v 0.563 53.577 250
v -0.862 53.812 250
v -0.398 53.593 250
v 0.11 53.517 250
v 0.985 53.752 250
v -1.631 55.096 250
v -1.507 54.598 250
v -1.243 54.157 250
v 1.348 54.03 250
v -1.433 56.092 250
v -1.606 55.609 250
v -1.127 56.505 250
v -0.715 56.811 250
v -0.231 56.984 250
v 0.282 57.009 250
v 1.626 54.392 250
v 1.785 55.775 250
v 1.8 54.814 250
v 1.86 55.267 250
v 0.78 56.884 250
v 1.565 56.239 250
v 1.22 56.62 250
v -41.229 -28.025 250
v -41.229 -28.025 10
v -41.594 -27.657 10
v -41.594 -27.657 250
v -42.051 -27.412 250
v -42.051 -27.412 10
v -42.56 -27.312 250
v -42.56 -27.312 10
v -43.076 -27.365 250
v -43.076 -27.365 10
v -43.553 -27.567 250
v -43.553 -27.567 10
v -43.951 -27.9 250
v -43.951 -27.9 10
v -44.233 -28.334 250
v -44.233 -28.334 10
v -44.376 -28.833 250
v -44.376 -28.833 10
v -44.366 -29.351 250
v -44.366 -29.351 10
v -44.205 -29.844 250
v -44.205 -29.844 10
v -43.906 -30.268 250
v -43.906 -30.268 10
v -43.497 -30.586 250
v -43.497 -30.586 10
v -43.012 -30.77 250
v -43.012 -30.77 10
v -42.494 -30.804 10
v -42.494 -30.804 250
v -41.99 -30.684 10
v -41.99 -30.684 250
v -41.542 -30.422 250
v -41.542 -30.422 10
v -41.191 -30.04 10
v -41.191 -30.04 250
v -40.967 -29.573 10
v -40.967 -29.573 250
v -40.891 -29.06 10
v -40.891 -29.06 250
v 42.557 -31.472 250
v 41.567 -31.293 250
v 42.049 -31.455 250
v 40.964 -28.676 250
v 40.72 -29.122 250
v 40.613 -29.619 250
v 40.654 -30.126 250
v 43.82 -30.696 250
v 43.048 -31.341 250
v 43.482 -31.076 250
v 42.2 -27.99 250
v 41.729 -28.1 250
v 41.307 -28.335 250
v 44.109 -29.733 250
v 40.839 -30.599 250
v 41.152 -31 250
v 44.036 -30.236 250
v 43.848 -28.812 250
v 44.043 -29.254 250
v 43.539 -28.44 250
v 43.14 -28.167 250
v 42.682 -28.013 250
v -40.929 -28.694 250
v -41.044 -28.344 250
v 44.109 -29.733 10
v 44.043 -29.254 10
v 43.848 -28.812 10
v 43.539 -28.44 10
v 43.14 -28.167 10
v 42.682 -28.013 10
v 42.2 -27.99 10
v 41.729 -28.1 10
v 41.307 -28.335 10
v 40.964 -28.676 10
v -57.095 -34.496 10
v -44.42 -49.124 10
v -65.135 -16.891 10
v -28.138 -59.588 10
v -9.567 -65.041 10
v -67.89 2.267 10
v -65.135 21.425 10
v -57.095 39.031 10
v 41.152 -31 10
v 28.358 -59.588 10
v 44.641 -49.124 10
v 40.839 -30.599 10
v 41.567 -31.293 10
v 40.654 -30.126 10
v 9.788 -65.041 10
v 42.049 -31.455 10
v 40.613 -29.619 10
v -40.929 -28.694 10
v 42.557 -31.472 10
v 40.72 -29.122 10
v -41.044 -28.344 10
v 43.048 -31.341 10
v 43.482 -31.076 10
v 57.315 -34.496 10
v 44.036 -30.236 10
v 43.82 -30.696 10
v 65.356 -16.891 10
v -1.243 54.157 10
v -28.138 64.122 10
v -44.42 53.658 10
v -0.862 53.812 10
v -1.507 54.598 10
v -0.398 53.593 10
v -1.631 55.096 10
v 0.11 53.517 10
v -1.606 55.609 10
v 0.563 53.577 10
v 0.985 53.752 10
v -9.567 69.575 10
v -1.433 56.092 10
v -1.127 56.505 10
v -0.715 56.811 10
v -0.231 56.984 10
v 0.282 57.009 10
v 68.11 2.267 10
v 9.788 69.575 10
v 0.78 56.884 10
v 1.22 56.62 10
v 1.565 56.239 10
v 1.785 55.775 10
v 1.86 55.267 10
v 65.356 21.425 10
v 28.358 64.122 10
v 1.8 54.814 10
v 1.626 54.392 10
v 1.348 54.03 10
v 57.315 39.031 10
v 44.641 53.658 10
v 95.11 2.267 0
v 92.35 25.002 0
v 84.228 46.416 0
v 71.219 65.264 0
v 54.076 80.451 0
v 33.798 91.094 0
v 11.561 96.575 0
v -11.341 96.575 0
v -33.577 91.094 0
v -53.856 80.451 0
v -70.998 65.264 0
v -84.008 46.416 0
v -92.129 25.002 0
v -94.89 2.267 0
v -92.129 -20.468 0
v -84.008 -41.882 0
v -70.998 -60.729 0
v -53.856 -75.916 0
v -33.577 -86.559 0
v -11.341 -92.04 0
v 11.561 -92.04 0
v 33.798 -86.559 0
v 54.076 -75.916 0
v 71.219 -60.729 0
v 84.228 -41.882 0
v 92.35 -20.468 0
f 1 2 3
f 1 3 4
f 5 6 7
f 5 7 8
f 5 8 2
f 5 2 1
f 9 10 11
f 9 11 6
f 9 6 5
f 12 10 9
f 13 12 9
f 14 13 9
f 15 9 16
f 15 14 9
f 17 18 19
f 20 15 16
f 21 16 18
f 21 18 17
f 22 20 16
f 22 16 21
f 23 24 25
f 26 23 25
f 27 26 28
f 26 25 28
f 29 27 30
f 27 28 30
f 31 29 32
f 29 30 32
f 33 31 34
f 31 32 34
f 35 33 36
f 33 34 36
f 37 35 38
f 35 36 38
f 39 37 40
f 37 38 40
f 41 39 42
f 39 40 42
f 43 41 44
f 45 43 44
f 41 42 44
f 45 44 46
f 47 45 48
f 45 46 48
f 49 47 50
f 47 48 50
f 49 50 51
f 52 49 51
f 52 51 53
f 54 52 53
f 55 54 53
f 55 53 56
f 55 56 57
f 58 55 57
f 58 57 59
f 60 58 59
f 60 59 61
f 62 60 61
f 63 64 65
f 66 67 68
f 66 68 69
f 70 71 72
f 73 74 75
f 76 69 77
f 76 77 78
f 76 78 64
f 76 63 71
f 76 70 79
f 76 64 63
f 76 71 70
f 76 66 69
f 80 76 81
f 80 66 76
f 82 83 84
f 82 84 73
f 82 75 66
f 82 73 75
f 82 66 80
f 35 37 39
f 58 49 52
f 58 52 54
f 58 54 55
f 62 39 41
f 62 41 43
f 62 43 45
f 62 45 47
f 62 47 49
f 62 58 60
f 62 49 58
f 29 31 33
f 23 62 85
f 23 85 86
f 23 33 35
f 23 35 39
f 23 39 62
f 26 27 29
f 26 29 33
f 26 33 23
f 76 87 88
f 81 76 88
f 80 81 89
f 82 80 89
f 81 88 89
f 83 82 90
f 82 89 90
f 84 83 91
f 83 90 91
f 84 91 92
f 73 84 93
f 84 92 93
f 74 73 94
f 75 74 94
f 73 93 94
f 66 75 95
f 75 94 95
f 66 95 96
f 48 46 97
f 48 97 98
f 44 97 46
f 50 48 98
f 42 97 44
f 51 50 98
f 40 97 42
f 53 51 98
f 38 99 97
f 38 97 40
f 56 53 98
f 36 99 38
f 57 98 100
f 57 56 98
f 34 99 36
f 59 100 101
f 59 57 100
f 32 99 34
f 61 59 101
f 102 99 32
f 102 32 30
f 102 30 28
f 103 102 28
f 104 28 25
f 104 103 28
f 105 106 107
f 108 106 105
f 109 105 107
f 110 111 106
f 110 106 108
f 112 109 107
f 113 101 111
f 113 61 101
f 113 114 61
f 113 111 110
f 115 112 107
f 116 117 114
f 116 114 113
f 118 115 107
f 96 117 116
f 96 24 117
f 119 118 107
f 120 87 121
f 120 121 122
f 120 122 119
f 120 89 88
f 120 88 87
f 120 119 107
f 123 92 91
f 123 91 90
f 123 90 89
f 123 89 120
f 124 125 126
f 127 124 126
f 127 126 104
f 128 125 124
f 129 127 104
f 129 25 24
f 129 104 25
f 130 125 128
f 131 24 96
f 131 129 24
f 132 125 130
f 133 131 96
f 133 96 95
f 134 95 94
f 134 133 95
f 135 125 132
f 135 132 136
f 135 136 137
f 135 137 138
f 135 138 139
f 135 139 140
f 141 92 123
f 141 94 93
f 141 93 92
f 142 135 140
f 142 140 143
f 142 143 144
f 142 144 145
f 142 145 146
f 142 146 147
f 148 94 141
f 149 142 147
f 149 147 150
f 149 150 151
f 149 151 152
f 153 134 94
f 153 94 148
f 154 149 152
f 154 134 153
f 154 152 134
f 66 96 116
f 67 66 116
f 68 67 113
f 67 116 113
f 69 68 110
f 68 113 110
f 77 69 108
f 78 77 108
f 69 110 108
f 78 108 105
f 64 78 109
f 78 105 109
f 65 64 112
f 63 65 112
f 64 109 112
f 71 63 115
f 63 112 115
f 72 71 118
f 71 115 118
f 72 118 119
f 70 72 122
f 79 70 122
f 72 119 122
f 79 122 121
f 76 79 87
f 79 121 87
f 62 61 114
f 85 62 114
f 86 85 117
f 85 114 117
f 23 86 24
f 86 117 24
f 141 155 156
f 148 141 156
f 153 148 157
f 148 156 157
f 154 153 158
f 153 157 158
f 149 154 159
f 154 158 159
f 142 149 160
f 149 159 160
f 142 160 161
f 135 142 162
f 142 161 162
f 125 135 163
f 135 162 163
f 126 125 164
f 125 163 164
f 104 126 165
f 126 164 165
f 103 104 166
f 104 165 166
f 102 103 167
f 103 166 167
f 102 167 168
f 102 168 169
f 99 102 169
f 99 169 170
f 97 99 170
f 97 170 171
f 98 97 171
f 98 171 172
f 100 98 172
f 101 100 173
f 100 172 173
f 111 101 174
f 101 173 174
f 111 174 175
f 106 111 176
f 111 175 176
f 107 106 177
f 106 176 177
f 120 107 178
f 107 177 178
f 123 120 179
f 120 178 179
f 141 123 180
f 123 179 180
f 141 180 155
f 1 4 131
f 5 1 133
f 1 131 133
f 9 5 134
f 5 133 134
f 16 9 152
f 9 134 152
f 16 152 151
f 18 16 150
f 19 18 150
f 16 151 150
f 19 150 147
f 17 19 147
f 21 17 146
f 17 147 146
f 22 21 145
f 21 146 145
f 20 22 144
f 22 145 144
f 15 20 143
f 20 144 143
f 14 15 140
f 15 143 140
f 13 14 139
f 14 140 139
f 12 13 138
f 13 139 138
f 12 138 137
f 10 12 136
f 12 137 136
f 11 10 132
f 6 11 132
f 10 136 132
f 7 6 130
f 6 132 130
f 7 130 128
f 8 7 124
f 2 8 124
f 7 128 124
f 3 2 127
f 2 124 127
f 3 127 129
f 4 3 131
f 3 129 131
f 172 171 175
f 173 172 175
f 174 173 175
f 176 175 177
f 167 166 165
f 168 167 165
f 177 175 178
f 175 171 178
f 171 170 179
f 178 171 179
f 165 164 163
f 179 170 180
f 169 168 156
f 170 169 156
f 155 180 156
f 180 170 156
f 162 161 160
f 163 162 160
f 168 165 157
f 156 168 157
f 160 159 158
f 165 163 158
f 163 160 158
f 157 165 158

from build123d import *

# Parameters (mm, degrees)
F0_R     = 95
F0_R_2   = 67.5
F1_DEPTH = 10
F2_DEPTH = 250
F3_SIZE2 = 9.99999
F3_SIZE  = 26.99999


# Not quite as in the source:
# - a fillet or chamfer is up to 0.001 mm smaller than in the source, because OpenCascade refuses the exact size


with BuildPart() as f1:
    # F0 (on Top) → F1 (new body)
    with BuildSketch(Plane.XY):
        with Locations((0.1100962768, 2.267197317)):
            Circle(F0_R)
        with Locations((0.1100962768, 2.267197317)):
            Circle(F0_R_2, mode=Mode.SUBTRACT)
        with Locations((0.1100962768, 2.267197317)):
            Circle(F0_R_2)
        with BuildLine():
            ThreePointArc((6.0992865392, 51.907197317), (37.5230586904, 35.4375190435), (50.1100962768, 2.267197317))
            ThreePointArc((50.1100962768, 2.267197317), (48.3767855016, -10.783730285), (43.2970278259, -22.9298053495))
            ThreePointArc((43.2970278259, -22.9298053495), (45.8842269178, -26.923009929), (44.7508248724, -31.5441225396))
            ThreePointArc((44.7508248724, -31.5441225396), (40.609581916, -33.8870690977), (36.064798075, -32.4784415259))
            ThreePointArc((36.064798075, -32.4784415259), (-0.285836282, -47.7312350325), (-36.3903563745, -31.9046764427))
            ThreePointArc((-36.3903563745, -31.9046764427), (-40.9568776568, -33.2411525931), (-45.060496325, -30.8329169426))
            ThreePointArc((-45.060496325, -30.8329169426), (-46.1205736098, -26.1944339166), (-43.4704592341, -22.2427023433))
            ThreePointArc((-43.4704592341, -22.2427023433), (-44.4863366402, 24.8760046956), (-5.8790939857, 51.907197317))
            ThreePointArc((-5.8790939857, 51.907197317), (-4.2579696568, 56.3805900773), (0.1100962768, 58.267197317))
            ThreePointArc((0.1100962768, 58.267197317), (4.4781622103, 56.3805900773), (6.0992865392, 51.907197317))
        make_face(mode=Mode.SUBTRACT)
        with BuildLine():
            ThreePointArc((45.1100962768, 2.267197317), (31.9299014302, 34.0870024704), (0.1100962768, 47.267197317))
            Line((0.1100962768, 47.267197317), (0.1100962768, 2.267197317))
            Line((0.1100962768, 2.267197317), (35.9821097803, -24.9026140037))
            ThreePointArc((35.9821097803, -24.9026140037), (42.7671039523, -12.0638771776), (45.1100962768, 2.267197317))
        make_face()
        with BuildLine():
            Line((0.1100962768, 2.267197317), (0.1100962768, 47.267197317))
            ThreePointArc((0.1100962768, 47.267197317), (-40.0266933485, 22.6151239577), (-36.1877015405, -24.3311085241))
            Line((-36.1877015405, -24.3311085241), (0.1100962768, 2.267197317))
        make_face()
        with BuildLine():
            ThreePointArc((-36.1877015405, -24.3311085241), (-0.2462430261, -42.7313917975), (35.9821097803, -24.9026140037))
            Line((35.9821097803, -24.9026140037), (0.1100962768, 2.267197317))
            Line((0.1100962768, 2.267197317), (-36.1877015405, -24.3311085241))
        make_face()
        with BuildLine():
            ThreePointArc((48.6100962768, 2.267197317), (34.4047751643, 36.5618762046), (0.1100962768, 50.767197317))
            Line((0.1100962768, 50.767197317), (0.1100962768, 48.267197317))
            ThreePointArc((0.1100962768, 48.267197317), (32.6370082114, 34.7941092516), (46.1100962768, 2.267197317))
            ThreePointArc((46.1100962768, 2.267197317), (43.7150374562, -12.3823454997), (36.7792656359, -25.5063875886))
            Line((36.7792656359, -25.5063875886), (38.772155275, -27.0158215509))
            ThreePointArc((38.772155275, -27.0158215509), (46.0848712159, -13.178516305), (48.6100962768, 2.267197317))
        make_face()
        with BuildLine():
            Line((0.1100962768, 48.267197317), (0.1100962768, 50.767197317))
            ThreePointArc((0.1100962768, 50.767197317), (-43.1484436527, 24.1977404742), (-39.0108635929, -26.399865645))
            Line((-39.0108635929, -26.399865645), (-36.9943192698, -24.9221819872))
            ThreePointArc((-36.9943192698, -24.9221819872), (-40.9186220069, 23.0673001053), (0.1100962768, 48.267197317))
        make_face()
        with BuildLine():
            ThreePointArc((-39.0108635929, -26.399865645), (-0.2739583052, -46.231282062), (38.772155275, -27.0158215509))
            Line((38.772155275, -27.0158215509), (36.7792656359, -25.5063875886))
            ThreePointArc((36.7792656359, -25.5063875886), (-0.2541616773, -43.7313604445), (-36.9943192698, -24.9221819872))
            Line((-36.9943192698, -24.9221819872), (-39.0108635929, -26.399865645))
        make_face()
        with BuildLine():
            ThreePointArc((43.2970278259, -22.9298053495), (48.3767855016, -10.783730285), (50.1100962768, 2.267197317))
            ThreePointArc((50.1100962768, 2.267197317), (37.5230586904, 35.4375190435), (6.0992865392, 51.907197317))
            ThreePointArc((6.0992865392, 51.907197317), (3.1100962768, 52.1771161709), (0.1100962768, 52.267197317))
            Line((0.1100962768, 52.267197317), (0.1100962768, 50.767197317))
            ThreePointArc((0.1100962768, 50.767197317), (34.4047751643, 36.5618762046), (48.6100962768, 2.267197317))
            ThreePointArc((48.6100962768, 2.267197317), (46.0848712159, -13.178516305), (38.772155275, -27.0158215509))
            Line((38.772155275, -27.0158215509), (39.9678890584, -27.9214819282))
            ThreePointArc((39.967889049, -27.9214819407), (41.7074010957, -25.4756257513), (43.2970278259, -22.9298053495))
        make_face()
        with BuildLine():
            Line((0.1100962768, 50.767197317), (0.1100962768, 52.267197317))
            ThreePointArc((0.1100962768, 52.267197317), (-2.8899037232, 52.1771161709), (-5.8790939857, 51.907197317))
            ThreePointArc((-5.8790939857, 51.907197317), (-44.4863366402, 24.8760046956), (-43.4704592341, -22.2427023433))
            ThreePointArc((-43.4704592341, -22.2427023433), (-41.9213495256, -24.8133780786), (-40.2207901845, -27.286475843))
            Line((-40.2207901869, -27.2864758397), (-39.0108635929, -26.399865645))
            ThreePointArc((-39.0108635929, -26.399865645), (-43.1484436527, 24.1977404742), (0.1100962768, 50.767197317))
        make_face()
        with BuildLine():
            ThreePointArc((36.064798075, -32.4784415259), (38.0847595855, -30.2585608845), (39.967889049, -27.9214819407))
            Line((39.9678890584, -27.9214819282), (38.772155275, -27.0158215509))
            ThreePointArc((38.772155275, -27.0158215509), (-0.2739583052, -46.231282062), (-39.0108635929, -26.399865645))
            Line((-39.0108635929, -26.399865645), (-40.2207901869, -27.2864758397))
            ThreePointArc((-40.2207901845, -27.286475843), (-38.3749087466, -29.6530844541), (-36.3903563745, -31.9046764427))
            ThreePointArc((-36.3903563745, -31.9046764427), (-0.285836282, -47.7312350325), (36.064798075, -32.4784415259))
        make_face()
        with BuildLine():
            ThreePointArc((46.1100962768, 2.267197317), (32.6370082114, 34.7941092516), (0.1100962768, 48.267197317))
            Line((0.1100962768, 48.267197317), (0.1100962768, 47.267197317))
            ThreePointArc((0.1100962768, 47.267197317), (31.9299014302, 34.0870024704), (45.1100962768, 2.267197317))
            ThreePointArc((45.1100962768, 2.267197317), (42.7671039523, -12.0638771776), (35.9821097803, -24.9026140037))
            Line((35.9821097803, -24.9026140037), (36.7792656359, -25.5063875886))
            ThreePointArc((36.7792656359, -25.5063875886), (43.7150374562, -12.3823454997), (46.1100962768, 2.267197317))
        make_face()
        with BuildLine():
            Line((0.1100962768, 47.267197317), (0.1100962768, 48.267197317))
            ThreePointArc((0.1100962768, 48.267197317), (-40.9186220069, 23.0673001053), (-36.9943192698, -24.9221819872))
            Line((-36.9943192698, -24.9221819872), (-36.1877015405, -24.3311085241))
            ThreePointArc((-36.1877015405, -24.3311085241), (-40.0266933485, 22.6151239577), (0.1100962768, 47.267197317))
        make_face()
        with BuildLine():
            ThreePointArc((-36.9943192698, -24.9221819872), (-0.2541616773, -43.7313604445), (36.7792656359, -25.5063875886))
            Line((36.7792656359, -25.5063875886), (35.9821097803, -24.9026140037))
            ThreePointArc((35.9821097803, -24.9026140037), (-0.2462430261, -42.7313917975), (-36.1877015405, -24.3311085241))
            Line((-36.1877015405, -24.3311085241), (-36.9943192698, -24.9221819872))
        make_face()
        with BuildLine():
            ThreePointArc((45.3593566253, -29.732802683), (43.3147615842, -26.8890021688), (39.967889049, -27.9214819407))
            ThreePointArc((39.967889049, -27.9214819407), (40.5480363259, -32.1242705947), (44.7508248724, -31.5441225396))
            ThreePointArc((44.7508248724, -31.5441225396), (45.2031573164, -30.6882071153), (45.3593566253, -29.732802683))
        make_face()
        with BuildLine():
            ThreePointArc((44.1093566253, -29.732802683), (41.8020370616, -31.3916863148), (40.964333878, -28.6761989094))
            ThreePointArc((40.964333878, -28.6761989094), (42.916676189, -28.0739190511), (44.1093566253, -29.732802683))
        make_face(mode=Mode.SUBTRACT)
        with BuildLine():
            ThreePointArc((-39.6406433747, -29.0596962292), (-39.7893665054, -28.1268402839), (-40.2207901845, -27.286475843))
            ThreePointArc((-40.2207901845, -27.286475843), (-44.4138639245, -26.6398431589), (-45.060496325, -30.8329169426))
            ThreePointArc((-45.060496325, -30.8329169426), (-41.7077872365, -31.9109730354), (-39.6406433747, -29.0596962292))
        make_face()
        with BuildLine():
            ThreePointArc((-40.8906433747, -29.0596962292), (-44.3038882147, -29.6038621984), (-41.2290623484, -28.0253176687))
            ThreePointArc((-41.2290623484, -28.0253176687), (-40.9773985346, -28.5155302599), (-40.8906433747, -29.0596962292))
        make_face(mode=Mode.SUBTRACT)
        with BuildLine():
            ThreePointArc((0.1100962768, 58.267197317), (-2.8899037232, 55.267197317), (0.1100962768, 52.267197317))
            ThreePointArc((0.1100962768, 52.267197317), (2.2314166203, 53.1458769735), (3.1100962768, 55.267197317))
            ThreePointArc((3.1100962768, 55.267197317), (2.2314166203, 57.3885176606), (0.1100962768, 58.267197317))
        make_face()
        with BuildLine():
            ThreePointArc((1.8600962768, 55.267197317), (1.3475331438, 54.02976045), (0.1100962768, 53.517197317))
            ThreePointArc((0.1100962768, 53.517197317), (-1.1273405903, 56.5046341841), (1.8600962768, 55.267197317))
        make_face(mode=Mode.SUBTRACT)
        with BuildLine():
            ThreePointArc((0.1100962768, 52.267197317), (3.1100962768, 52.1771161709), (6.0992865392, 51.907197317))
            ThreePointArc((6.0992865392, 51.907197317), (4.4781622103, 56.3805900773), (0.1100962768, 58.267197317))
            ThreePointArc((0.1100962768, 58.267197317), (2.2314166203, 57.3885176606), (3.1100962768, 55.267197317))
            ThreePointArc((3.1100962768, 55.267197317), (2.2314166203, 53.1458769735), (0.1100962768, 52.267197317))
        make_face()
        with BuildLine():
            ThreePointArc((-5.8790939857, 51.907197317), (-2.8899037232, 52.1771161709), (0.1100962768, 52.267197317))
            ThreePointArc((0.1100962768, 52.267197317), (-2.8899037232, 55.267197317), (0.1100962768, 58.267197317))
            ThreePointArc((0.1100962768, 58.267197317), (-4.2579696568, 56.3805900773), (-5.8790939857, 51.907197317))
        make_face()
        with BuildLine():
            ThreePointArc((-40.2207901845, -27.286475843), (-41.9213495256, -24.8133780786), (-43.4704592341, -22.2427023433))
            ThreePointArc((-43.4704592341, -22.2427023433), (-46.1205736098, -26.1944339166), (-45.060496325, -30.8329169426))
            ThreePointArc((-45.060496325, -30.8329169426), (-44.4138639245, -26.6398431589), (-40.2207901845, -27.286475843))
        make_face()
        with BuildLine():
            ThreePointArc((-45.060496325, -30.8329169426), (-40.9568776568, -33.2411525931), (-36.3903563745, -31.9046764427))
            ThreePointArc((-36.3903563745, -31.9046764427), (-38.3749087466, -29.6530844541), (-40.2207901845, -27.286475843))
            ThreePointArc((-40.2207901845, -27.286475843), (-39.7893665054, -28.1268402839), (-39.6406433747, -29.0596962292))
            ThreePointArc((-39.6406433747, -29.0596962292), (-41.7077872365, -31.9109730354), (-45.060496325, -30.8329169426))
        make_face()
        with BuildLine():
            ThreePointArc((44.7508248724, -31.5441225396), (40.5480363259, -32.1242705947), (39.967889049, -27.9214819407))
            ThreePointArc((39.967889049, -27.9214819407), (38.0847595855, -30.2585608845), (36.064798075, -32.4784415259))
            ThreePointArc((36.064798075, -32.4784415259), (40.609581916, -33.8870690977), (44.7508248724, -31.5441225396))
        make_face()
        with BuildLine():
            ThreePointArc((44.7508248724, -31.5441225396), (45.8842269178, -26.923009929), (43.2970278259, -22.9298053495))
            ThreePointArc((43.2970278259, -22.9298053495), (41.7074010957, -25.4756257513), (39.967889049, -27.9214819407))
            ThreePointArc((39.967889049, -27.9214819407), (43.3147615842, -26.8890021688), (45.3593566253, -29.732802683))
            ThreePointArc((45.3593566253, -29.732802683), (45.2031573164, -30.6882071153), (44.7508248724, -31.5441225396))
        make_face()
        with BuildLine():
            ThreePointArc((-40.8906433747, -29.0596962292), (-40.9773985346, -28.5155302599), (-41.2290623484, -28.0253176687))
            ThreePointArc((-41.2290623484, -28.0253176687), (-44.3038882147, -29.6038621984), (-40.8906433747, -29.0596962292))
        make_face()
        with BuildLine():
            ThreePointArc((1.8600962768, 55.267197317), (-1.1273405903, 56.5046341841), (0.1100962768, 53.517197317))
            ThreePointArc((0.1100962768, 53.517197317), (1.3475331438, 54.02976045), (1.8600962768, 55.267197317))
        make_face()
        with BuildLine():
            ThreePointArc((44.1093566253, -29.732802683), (42.916676189, -28.0739190511), (40.964333878, -28.6761989094))
            ThreePointArc((40.964333878, -28.6761989094), (41.8020370616, -31.3916863148), (44.1093566253, -29.732802683))
        make_face()
    extrude(amount=F1_DEPTH)

    # F0 (on Top) → F2 (join)
    with BuildSketch(Plane.XY):
        with BuildLine():
            ThreePointArc((-40.8906433747, -29.0596962292), (-40.9773985346, -28.5155302599), (-41.2290623484, -28.0253176687))
            ThreePointArc((-41.2290623484, -28.0253176687), (-44.3038882147, -29.6038621984), (-40.8906433747, -29.0596962292))
        make_face()
        with BuildLine():
            ThreePointArc((44.1093566253, -29.732802683), (42.916676189, -28.0739190511), (40.964333878, -28.6761989094))
            ThreePointArc((40.964333878, -28.6761989094), (41.8020370616, -31.3916863148), (44.1093566253, -29.732802683))
        make_face()
        with BuildLine():
            ThreePointArc((1.8600962768, 55.267197317), (-1.1273405903, 56.5046341841), (0.1100962768, 53.517197317))
            ThreePointArc((0.1100962768, 53.517197317), (1.3475331438, 54.02976045), (1.8600962768, 55.267197317))
        make_face()
    extrude(amount=F2_DEPTH)

    # F3 (size 27 and 10 in the source; OpenCascade refuses exactly that, so slightly less here)
    f3_edges = [f1.edges().sort_by_distance(p)[0] for p in [
        (-94.889904, 2.267197, 10),
    ]]
    f3_side = f1.faces().sort_by_distance((0.110267, 2.270705, 10))[0]
    chamfer(f3_edges, length=F3_SIZE, length2=F3_SIZE2, reference=f3_side)


solid = f1.part
